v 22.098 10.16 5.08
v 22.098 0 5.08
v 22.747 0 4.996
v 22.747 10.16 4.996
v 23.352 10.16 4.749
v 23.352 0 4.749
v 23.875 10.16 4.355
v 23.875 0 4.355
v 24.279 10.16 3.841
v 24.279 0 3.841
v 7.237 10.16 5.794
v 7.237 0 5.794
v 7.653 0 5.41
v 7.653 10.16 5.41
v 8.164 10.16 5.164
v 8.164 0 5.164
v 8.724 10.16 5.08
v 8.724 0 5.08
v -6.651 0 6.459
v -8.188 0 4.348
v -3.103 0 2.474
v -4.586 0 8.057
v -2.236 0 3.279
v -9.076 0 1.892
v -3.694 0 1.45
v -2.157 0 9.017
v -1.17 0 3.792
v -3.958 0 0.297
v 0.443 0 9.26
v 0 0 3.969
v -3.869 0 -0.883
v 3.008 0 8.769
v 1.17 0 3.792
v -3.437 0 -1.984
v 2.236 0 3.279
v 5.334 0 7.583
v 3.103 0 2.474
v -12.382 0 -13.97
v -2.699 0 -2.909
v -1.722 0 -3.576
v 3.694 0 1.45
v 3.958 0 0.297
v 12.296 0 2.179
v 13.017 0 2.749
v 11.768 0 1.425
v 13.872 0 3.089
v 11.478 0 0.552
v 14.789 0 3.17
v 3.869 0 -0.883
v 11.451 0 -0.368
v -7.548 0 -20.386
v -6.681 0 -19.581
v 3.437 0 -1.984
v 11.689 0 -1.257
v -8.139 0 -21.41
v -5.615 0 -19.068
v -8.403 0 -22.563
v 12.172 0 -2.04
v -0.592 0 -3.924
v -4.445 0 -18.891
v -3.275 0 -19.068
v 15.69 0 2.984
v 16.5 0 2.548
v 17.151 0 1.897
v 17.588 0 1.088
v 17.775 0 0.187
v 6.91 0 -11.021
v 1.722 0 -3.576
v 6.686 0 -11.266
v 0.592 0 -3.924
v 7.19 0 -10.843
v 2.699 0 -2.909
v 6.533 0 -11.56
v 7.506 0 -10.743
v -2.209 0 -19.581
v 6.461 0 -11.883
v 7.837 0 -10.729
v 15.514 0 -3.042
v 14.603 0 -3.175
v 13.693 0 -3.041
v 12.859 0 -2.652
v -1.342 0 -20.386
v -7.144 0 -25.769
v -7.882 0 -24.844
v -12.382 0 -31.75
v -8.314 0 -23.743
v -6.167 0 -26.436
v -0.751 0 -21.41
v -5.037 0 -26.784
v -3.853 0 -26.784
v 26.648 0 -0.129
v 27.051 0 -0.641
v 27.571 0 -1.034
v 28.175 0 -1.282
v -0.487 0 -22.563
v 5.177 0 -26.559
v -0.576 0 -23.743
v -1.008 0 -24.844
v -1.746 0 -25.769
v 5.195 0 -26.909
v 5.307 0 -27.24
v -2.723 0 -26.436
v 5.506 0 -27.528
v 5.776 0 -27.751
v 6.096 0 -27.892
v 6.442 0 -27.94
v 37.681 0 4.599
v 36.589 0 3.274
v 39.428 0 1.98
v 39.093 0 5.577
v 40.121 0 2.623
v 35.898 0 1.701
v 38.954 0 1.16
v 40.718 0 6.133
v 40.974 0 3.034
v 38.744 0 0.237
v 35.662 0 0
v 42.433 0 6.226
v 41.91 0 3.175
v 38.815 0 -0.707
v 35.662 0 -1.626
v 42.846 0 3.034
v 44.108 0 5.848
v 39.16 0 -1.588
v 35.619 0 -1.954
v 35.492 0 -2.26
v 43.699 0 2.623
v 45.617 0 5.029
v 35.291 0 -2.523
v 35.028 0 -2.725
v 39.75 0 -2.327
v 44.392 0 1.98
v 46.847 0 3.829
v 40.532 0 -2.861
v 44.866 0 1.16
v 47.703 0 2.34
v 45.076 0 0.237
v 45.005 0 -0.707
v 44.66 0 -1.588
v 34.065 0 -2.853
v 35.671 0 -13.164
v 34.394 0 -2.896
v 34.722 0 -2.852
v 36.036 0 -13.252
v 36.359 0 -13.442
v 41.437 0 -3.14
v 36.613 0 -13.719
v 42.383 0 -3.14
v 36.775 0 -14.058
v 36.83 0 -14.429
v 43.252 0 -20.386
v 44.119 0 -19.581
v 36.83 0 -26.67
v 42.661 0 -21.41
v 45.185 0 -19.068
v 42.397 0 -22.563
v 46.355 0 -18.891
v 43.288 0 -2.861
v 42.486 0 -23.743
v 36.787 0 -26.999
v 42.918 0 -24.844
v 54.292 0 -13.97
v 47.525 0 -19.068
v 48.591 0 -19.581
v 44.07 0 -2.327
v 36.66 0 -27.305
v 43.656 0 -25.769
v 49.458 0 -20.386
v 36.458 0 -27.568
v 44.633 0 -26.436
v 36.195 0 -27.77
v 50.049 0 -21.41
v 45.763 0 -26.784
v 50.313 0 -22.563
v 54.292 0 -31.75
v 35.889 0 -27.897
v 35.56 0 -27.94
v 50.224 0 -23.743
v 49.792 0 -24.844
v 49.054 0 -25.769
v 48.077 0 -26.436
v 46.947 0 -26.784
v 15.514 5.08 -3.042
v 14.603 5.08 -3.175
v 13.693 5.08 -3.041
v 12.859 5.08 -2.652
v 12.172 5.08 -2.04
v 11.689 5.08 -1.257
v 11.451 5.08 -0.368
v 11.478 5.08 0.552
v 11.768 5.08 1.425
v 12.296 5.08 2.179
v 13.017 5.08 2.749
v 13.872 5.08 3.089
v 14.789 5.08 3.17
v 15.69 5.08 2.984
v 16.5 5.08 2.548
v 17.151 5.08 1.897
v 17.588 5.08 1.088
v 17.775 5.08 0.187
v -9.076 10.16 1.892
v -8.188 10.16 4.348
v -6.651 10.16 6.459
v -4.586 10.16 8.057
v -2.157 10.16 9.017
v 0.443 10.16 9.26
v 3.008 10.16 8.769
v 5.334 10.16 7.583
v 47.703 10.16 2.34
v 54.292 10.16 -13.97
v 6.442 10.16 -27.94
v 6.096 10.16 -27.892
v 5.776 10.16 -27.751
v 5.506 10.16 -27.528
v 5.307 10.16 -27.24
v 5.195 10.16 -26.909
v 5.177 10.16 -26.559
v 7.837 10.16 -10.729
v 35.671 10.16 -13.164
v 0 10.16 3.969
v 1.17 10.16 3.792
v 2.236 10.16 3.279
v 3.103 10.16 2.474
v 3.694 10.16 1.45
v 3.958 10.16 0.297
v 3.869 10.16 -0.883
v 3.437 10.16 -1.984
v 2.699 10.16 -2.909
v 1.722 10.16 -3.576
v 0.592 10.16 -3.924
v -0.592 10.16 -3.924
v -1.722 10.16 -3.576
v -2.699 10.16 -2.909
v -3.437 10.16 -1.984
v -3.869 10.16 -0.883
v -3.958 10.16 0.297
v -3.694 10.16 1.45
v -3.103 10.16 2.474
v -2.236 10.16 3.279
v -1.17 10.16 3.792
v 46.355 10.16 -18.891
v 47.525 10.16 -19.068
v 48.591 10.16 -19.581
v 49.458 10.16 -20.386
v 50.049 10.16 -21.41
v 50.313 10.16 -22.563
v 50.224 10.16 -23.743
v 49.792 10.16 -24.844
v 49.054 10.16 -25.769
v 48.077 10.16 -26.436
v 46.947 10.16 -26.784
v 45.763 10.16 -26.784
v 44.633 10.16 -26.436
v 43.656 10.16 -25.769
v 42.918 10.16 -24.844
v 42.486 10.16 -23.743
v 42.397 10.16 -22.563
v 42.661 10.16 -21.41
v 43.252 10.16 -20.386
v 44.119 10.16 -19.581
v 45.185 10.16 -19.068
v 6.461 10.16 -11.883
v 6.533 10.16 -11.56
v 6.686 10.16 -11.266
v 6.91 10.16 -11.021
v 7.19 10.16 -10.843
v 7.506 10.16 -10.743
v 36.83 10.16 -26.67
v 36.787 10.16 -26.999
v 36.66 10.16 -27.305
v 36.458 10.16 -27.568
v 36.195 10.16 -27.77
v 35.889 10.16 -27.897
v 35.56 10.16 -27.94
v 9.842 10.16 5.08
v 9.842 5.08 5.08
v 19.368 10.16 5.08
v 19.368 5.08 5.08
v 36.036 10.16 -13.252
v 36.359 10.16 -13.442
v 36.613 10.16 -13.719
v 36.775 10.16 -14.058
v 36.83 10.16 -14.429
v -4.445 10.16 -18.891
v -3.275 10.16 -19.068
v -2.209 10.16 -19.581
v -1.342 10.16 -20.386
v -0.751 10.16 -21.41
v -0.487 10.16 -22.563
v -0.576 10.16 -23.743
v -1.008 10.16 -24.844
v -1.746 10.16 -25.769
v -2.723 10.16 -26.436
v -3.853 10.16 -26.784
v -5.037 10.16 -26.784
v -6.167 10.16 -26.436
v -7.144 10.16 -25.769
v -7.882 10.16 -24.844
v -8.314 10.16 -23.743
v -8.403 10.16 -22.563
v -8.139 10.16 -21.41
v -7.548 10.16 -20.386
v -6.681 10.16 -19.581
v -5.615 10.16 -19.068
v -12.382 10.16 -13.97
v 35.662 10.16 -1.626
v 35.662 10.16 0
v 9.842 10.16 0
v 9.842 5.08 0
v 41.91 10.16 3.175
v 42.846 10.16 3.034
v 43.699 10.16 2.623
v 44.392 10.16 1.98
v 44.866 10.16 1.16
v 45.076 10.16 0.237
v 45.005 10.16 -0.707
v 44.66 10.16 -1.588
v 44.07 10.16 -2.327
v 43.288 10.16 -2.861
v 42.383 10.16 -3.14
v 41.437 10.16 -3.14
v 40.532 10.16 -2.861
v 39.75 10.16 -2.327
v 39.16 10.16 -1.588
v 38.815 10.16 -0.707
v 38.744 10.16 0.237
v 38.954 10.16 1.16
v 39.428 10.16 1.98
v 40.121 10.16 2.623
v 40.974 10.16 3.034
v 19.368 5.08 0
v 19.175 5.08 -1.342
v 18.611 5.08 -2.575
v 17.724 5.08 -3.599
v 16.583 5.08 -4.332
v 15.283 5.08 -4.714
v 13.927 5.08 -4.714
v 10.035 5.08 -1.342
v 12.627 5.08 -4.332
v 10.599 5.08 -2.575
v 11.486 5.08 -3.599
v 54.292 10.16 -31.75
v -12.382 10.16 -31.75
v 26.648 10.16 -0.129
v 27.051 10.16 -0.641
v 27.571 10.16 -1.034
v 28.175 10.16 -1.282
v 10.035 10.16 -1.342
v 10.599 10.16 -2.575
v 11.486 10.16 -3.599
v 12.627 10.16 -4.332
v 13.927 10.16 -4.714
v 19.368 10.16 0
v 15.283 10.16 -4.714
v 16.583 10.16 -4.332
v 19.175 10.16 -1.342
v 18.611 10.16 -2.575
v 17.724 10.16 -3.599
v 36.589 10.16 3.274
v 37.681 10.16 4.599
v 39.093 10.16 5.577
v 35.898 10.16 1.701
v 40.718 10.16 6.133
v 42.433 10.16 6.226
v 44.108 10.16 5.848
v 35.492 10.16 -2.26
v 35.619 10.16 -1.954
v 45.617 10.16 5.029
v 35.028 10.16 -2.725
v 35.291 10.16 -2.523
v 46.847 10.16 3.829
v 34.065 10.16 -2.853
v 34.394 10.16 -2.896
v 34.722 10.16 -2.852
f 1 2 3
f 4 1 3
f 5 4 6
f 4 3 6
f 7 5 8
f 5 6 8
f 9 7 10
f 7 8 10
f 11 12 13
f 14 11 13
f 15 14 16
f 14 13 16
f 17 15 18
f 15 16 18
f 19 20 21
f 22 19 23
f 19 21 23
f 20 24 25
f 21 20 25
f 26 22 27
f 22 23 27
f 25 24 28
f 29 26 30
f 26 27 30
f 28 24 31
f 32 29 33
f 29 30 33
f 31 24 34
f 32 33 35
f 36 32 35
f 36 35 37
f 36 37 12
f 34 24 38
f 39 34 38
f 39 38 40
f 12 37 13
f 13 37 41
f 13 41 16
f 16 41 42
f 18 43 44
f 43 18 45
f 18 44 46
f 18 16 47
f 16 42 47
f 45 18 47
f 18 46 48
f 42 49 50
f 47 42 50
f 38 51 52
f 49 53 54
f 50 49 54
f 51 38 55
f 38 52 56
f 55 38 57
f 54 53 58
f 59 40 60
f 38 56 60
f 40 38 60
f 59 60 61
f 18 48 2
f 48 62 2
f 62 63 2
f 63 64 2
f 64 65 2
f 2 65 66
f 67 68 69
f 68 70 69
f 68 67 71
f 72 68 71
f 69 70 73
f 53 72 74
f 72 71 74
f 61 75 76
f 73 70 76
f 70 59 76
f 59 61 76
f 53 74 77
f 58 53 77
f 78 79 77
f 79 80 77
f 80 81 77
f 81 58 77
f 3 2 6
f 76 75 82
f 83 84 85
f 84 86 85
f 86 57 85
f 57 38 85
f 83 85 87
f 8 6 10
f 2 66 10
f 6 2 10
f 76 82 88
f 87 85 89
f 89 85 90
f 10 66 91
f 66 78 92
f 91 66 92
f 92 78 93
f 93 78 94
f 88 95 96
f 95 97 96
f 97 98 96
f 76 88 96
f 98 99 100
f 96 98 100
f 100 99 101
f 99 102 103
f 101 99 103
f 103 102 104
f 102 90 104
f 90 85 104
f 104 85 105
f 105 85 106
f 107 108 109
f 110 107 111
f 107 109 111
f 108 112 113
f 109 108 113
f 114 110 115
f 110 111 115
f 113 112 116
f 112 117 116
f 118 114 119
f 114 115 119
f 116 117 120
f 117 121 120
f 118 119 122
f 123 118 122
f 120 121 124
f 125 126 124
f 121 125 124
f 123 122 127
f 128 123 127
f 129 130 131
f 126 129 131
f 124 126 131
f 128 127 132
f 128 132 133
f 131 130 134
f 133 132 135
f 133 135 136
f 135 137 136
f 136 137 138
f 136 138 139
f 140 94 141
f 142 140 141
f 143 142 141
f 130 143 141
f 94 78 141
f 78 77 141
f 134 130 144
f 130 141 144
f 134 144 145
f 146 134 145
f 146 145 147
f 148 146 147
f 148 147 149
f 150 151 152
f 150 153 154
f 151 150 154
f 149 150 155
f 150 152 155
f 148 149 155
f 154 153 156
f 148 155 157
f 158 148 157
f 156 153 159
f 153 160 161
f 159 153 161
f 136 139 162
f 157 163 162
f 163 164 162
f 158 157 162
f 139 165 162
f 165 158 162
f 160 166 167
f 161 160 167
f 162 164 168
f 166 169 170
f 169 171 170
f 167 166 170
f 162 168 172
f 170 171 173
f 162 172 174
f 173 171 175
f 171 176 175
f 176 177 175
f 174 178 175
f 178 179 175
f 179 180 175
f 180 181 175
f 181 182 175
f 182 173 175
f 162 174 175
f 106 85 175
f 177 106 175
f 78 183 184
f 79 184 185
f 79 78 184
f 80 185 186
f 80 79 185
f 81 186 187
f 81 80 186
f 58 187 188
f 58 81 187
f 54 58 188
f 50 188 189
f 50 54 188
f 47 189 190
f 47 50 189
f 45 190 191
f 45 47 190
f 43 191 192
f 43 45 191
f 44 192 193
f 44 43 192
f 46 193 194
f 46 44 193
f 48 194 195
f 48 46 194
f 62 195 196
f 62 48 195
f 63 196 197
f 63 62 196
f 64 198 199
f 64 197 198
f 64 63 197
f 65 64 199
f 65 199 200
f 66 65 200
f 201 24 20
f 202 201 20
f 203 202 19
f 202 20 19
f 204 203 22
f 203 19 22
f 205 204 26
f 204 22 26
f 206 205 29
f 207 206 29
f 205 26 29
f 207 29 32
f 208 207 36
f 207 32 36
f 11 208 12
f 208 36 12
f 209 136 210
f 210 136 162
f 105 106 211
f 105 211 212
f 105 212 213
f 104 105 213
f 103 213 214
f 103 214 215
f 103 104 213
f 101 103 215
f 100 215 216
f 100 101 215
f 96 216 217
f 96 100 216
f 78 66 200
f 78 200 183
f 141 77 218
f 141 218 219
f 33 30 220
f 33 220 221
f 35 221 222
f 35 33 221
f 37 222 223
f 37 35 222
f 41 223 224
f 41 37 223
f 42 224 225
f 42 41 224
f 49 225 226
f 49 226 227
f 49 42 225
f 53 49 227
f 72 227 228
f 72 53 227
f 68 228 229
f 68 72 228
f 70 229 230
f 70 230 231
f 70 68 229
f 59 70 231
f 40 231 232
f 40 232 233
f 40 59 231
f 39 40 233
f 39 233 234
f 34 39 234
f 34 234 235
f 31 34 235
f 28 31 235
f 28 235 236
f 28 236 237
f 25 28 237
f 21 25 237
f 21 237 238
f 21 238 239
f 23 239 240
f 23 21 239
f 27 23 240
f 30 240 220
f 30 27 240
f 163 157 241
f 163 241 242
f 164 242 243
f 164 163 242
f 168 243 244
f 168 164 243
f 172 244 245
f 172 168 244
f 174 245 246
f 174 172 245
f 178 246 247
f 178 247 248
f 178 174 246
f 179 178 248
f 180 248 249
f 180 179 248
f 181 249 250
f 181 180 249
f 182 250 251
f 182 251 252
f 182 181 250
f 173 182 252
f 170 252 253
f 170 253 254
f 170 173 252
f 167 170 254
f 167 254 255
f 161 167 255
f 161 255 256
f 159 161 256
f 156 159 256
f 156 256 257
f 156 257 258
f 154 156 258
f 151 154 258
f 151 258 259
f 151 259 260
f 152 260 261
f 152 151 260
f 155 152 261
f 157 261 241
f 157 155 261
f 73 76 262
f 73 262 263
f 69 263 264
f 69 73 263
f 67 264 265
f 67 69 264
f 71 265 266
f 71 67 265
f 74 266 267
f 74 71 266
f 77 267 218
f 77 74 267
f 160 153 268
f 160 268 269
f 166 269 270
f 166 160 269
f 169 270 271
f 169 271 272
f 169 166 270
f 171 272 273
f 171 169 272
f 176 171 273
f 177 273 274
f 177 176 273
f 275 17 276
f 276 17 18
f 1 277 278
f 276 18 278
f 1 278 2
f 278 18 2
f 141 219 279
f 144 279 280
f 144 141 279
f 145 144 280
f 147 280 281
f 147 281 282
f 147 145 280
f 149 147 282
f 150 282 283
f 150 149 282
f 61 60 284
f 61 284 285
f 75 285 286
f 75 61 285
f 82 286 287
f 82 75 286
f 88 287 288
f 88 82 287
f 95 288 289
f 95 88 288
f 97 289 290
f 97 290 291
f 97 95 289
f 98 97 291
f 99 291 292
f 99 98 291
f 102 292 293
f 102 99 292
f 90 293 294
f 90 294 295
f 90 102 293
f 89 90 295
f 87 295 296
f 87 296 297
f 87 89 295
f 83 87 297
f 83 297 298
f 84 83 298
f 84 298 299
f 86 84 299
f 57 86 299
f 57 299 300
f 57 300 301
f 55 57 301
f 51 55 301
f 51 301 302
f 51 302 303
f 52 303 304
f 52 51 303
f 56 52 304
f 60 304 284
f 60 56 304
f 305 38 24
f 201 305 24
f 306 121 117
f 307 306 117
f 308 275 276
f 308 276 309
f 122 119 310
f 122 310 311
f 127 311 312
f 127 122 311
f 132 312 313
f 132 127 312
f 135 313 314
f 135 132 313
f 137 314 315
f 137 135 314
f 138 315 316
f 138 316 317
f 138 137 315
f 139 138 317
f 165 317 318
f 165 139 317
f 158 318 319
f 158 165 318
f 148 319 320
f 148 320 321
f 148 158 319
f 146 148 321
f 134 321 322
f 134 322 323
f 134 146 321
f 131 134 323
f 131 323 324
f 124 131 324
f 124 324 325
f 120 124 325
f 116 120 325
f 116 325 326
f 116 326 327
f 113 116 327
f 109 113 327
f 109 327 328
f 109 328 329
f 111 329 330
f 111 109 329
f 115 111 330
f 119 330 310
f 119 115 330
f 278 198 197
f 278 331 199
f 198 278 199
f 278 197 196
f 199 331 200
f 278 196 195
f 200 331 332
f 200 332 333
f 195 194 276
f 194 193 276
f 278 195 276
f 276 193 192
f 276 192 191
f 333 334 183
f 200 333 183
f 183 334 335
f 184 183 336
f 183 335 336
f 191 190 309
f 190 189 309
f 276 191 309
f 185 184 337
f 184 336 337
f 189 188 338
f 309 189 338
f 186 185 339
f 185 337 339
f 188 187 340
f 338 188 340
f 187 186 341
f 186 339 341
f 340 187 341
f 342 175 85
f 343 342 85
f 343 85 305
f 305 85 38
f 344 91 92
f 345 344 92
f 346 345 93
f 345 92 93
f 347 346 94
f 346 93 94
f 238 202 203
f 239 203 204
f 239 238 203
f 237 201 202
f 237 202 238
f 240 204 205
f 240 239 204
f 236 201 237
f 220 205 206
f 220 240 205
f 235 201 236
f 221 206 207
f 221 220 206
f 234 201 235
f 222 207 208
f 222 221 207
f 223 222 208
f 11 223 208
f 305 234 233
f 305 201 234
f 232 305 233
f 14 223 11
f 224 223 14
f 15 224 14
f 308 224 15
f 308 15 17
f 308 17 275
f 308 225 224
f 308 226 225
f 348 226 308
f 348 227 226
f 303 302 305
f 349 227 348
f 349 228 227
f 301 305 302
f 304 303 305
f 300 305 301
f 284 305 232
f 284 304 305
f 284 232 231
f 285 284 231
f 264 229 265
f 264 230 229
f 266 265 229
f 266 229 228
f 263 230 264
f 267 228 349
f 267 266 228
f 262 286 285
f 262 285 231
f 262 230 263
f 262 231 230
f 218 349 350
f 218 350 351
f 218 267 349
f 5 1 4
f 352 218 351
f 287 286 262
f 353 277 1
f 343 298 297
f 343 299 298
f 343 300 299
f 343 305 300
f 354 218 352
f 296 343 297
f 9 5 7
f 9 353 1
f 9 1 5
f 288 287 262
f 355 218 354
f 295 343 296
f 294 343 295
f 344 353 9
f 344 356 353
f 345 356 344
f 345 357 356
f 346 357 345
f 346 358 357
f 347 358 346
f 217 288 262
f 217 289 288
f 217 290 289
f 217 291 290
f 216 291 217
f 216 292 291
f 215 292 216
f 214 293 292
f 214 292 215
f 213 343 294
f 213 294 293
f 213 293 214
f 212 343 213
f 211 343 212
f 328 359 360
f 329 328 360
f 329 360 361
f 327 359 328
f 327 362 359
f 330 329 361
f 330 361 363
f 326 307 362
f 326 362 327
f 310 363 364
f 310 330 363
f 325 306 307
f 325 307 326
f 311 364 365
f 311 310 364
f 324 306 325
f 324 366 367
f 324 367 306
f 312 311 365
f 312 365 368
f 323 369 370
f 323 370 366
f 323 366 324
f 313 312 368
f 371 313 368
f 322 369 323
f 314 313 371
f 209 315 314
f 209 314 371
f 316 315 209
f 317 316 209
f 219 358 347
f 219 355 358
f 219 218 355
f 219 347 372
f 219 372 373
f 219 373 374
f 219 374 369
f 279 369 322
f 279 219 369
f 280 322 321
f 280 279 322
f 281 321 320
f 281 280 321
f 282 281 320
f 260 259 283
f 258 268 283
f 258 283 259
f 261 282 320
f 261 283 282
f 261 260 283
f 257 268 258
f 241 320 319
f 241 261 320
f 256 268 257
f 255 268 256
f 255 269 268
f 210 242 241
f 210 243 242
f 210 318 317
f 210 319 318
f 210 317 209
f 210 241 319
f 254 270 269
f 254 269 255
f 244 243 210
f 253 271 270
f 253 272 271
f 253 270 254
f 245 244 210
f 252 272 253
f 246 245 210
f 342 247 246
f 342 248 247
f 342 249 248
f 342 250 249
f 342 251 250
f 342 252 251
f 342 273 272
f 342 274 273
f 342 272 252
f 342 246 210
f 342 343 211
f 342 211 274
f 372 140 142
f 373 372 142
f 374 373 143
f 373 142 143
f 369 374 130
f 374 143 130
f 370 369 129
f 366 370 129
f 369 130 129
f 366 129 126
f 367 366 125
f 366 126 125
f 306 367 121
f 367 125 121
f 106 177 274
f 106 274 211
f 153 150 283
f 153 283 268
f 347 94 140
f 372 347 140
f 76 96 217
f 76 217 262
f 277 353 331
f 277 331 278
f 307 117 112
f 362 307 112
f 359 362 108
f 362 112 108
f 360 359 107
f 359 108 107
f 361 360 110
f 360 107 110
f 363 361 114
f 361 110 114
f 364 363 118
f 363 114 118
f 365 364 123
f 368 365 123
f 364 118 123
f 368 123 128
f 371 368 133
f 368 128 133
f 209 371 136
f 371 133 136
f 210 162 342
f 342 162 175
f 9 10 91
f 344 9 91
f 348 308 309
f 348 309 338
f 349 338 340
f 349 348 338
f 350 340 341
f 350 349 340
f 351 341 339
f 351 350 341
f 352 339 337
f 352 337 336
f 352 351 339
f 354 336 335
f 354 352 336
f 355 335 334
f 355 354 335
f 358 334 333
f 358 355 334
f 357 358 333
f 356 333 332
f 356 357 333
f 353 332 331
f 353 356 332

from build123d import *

# Parameters (mm, degrees)
SKETCH3_R           = 3.96875
SKETCH3_R_2         = 3.175
BOSS_EXTRUDE4_DEPTH = 10.16
CUT_EXTRUDE3_DEPTH  = 5.08


with BuildPart() as part:
    # Sketch3 → Boss-Extrude4 (new body)
    with BuildSketch(Plane(origin=(0, 0, 0), x_dir=(1, 0, 0), z_dir=(0, 1, 0))):
        with BuildLine():
            Line((54.2925, 31.75), (-12.3825, 31.75))
            Line((-12.3825, 31.75), (-12.3825, 13.97))
            Line((-12.3825, 13.97), (-9.075895852, -1.891971323))
            ThreePointArc((-9.075895852, -1.891971323), (-2.156945737, -9.016597256), (7.237172055, -5.794375))
            ThreePointArc((7.237172055, -5.794375), (7.899373007, -5.267856205), (8.724262204, -5.08))
            Line((8.724262204, -5.08), (22.098, -5.08))
            ThreePointArc((22.098, -5.08), (23.352279932, -4.748705923), (24.279366546, -3.841245553))
            Line((24.279366546, -3.841245553), (26.647633454, 0.128841561))
            ThreePointArc((26.647633454, 0.128841561), (27.298361404, 0.854600075), (28.174517214, 1.281827513))
            Line((28.174517214, 1.281827513), (34.065158638, 2.852715753))
            ThreePointArc((34.065158638, 2.852715753), (35.166125897, 2.632698945), (35.662400031, 1.6256))
            Line((35.662400031, 1.6256), (35.662400031, 0))
            ThreePointArc((35.662400031, 0), (40.717901726, -6.132813961), (47.702673821, -2.340392141))
            Line((47.702673821, -2.340392141), (54.2925, 13.97))
            Line((54.2925, 13.97), (54.2925, 31.75))
        make_face()
        Circle(SKETCH3_R, mode=Mode.SUBTRACT)
        with Locations((-4.445, 22.86)):
            Circle(SKETCH3_R, mode=Mode.SUBTRACT)
        with Locations((46.355, 22.86)):
            Circle(SKETCH3_R, mode=Mode.SUBTRACT)
        with Locations((41.91, 0)):
            Circle(SKETCH3_R_2, mode=Mode.SUBTRACT)
        with BuildLine():
            Line((17.774504023, -0.186733089), (15.513562514, 3.04222602))
            ThreePointArc((15.513562514, 3.04222602), (12.004192259, -1.821105185), (17.774504023, -0.186733089))
        make_face(mode=Mode.SUBTRACT)
        with BuildLine():
            Line((36.83, 14.42919116), (36.83, 26.67))
            ThreePointArc((36.83, 26.67), (36.458025612, 27.568025612), (35.56, 27.94))
            Line((35.56, 27.94), (6.442341733, 27.94))
            ThreePointArc((6.442341733, 27.94), (5.505999515, 27.527999564), (5.177174467, 26.559312207))
            Line((5.177174467, 26.559312207), (6.461152869, 11.883371914))
            ThreePointArc((6.461152869, 11.883371914), (6.909979871, 11.021183265), (7.837007929, 10.728892441))
            Line((7.837007929, 10.728892441), (35.670687793, 13.164023894))
            ThreePointArc((35.670687793, 13.164023894), (36.496342218, 13.571191596), (36.83, 14.42919116))
        make_face(mode=Mode.SUBTRACT)
    extrude(amount=BOSS_EXTRUDE4_DEPTH)

    # Sketch5 → Cut-Extrude3 (cut)
    with BuildSketch(Plane(origin=(0, 10.16, 0), x_dir=(1, 0, 0), z_dir=(0, 1, 0))):
        with BuildLine():
            Line((19.3675, 0), (19.3675, -5.08))
            Line((19.3675, -5.08), (9.8425, -5.08))
            Line((9.8425, -5.08), (9.8425, 0))
            ThreePointArc((9.8425, 0), (14.605, 4.7625), (19.3675, 0))
        make_face()
    extrude(amount=-CUT_EXTRUDE3_DEPTH, mode=Mode.SUBTRACT)


solid = part.part
